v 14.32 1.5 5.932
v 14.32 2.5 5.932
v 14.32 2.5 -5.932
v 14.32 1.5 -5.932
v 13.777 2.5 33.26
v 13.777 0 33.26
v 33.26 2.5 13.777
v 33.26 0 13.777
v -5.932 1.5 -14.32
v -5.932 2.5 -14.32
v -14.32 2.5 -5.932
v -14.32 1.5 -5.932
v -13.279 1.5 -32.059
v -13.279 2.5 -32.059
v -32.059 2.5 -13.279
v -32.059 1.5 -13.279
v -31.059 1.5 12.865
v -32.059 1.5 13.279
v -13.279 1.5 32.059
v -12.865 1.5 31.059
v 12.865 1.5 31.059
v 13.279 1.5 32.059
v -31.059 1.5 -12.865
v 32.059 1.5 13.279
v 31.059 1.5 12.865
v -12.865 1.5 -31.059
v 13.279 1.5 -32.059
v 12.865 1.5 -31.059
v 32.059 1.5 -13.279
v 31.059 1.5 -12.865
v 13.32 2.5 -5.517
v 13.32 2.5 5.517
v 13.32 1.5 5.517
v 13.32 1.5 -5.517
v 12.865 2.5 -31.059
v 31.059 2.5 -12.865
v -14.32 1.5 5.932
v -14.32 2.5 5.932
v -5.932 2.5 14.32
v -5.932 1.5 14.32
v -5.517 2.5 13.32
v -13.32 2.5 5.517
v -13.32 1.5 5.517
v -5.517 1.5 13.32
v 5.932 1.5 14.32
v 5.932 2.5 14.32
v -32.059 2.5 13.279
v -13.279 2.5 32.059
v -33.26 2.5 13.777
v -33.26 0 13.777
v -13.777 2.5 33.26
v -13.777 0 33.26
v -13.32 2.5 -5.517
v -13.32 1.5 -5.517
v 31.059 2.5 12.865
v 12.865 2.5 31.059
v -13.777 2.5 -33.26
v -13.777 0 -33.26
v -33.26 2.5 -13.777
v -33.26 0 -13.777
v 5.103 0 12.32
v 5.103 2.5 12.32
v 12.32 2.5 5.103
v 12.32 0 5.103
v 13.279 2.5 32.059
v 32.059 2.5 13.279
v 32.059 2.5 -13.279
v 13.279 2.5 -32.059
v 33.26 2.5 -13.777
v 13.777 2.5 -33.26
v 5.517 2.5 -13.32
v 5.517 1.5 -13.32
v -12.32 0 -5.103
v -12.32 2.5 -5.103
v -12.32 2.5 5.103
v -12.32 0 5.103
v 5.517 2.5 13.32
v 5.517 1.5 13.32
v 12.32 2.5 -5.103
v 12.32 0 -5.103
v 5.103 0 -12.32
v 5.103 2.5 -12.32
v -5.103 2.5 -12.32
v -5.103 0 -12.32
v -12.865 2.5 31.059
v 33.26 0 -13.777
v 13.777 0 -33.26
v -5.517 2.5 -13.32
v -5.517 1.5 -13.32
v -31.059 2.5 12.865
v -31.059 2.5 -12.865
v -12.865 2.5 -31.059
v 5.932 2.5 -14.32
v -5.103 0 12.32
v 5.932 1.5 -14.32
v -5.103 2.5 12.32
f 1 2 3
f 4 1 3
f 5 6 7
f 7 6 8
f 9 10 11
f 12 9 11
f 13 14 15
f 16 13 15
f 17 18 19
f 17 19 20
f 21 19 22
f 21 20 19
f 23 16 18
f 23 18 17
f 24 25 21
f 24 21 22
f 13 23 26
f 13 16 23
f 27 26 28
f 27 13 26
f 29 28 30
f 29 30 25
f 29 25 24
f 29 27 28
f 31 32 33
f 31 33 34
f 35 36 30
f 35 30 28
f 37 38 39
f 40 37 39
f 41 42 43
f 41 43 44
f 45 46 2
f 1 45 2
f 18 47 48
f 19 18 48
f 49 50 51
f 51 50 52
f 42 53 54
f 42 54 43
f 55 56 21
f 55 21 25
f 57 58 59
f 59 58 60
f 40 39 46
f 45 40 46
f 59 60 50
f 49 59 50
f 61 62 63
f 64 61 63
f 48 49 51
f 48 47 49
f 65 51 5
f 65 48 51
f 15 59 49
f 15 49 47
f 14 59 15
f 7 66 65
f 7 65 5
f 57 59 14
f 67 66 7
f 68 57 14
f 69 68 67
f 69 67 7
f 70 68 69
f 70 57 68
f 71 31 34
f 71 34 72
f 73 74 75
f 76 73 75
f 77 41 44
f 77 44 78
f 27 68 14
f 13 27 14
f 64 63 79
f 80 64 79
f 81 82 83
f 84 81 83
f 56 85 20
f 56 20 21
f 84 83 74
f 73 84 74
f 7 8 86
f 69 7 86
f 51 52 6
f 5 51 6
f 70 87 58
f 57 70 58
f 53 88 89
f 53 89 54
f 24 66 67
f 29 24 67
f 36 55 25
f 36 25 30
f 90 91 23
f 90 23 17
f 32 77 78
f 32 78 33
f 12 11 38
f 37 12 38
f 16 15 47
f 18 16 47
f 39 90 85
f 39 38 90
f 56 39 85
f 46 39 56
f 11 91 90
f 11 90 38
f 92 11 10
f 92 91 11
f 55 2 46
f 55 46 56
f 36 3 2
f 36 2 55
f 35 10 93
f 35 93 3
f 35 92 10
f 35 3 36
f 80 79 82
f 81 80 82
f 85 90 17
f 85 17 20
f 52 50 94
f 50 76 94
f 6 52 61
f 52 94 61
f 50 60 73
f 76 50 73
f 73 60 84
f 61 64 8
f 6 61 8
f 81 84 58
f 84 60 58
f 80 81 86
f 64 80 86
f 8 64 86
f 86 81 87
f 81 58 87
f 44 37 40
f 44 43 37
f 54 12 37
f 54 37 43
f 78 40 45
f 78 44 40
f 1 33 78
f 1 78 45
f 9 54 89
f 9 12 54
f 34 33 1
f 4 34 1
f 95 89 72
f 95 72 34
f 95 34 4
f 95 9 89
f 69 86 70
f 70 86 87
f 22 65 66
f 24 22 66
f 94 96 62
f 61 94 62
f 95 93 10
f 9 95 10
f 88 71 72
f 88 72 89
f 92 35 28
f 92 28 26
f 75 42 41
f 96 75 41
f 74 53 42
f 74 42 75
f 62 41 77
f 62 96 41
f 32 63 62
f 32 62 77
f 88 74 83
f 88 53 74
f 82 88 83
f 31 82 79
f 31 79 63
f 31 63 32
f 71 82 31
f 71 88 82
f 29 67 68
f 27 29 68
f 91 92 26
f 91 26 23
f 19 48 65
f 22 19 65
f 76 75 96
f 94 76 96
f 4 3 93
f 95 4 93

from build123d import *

# Parameters (mm, degrees)
EXTRUDE_1_DEPTH     = 2.5
CUT_EXTRUDE_1_DEPTH = 1
CUT_EXTRUDE_2_DEPTH = 3.8
CUT_EXTRUDE_3_DEPTH = 1


with BuildPart() as part:
    # 스케치1 → 보스-돌출1 (new body)
    with BuildSketch(Plane(origin=(0, 0, 0), x_dir=(1, 0, 0), z_dir=(0, 1, 0))):
        Polygon((-13.776603565, -33.25966317), (13.776603565, -33.25966317), (33.25966317, -13.776603565), (33.25966317, 13.776603565), (13.776603565, 33.25966317), (-13.776603565, 33.25966317), (-33.25966317, 13.776603565), (-33.25966317, -13.776603565), align=None)
    extrude(amount=EXTRUDE_1_DEPTH)

    # 스케치2 → 컷-돌출1 (cut)
    with BuildSketch(Plane(origin=(0, 2.5, 0), x_dir=(1, 0, 0), z_dir=(0, 1, 0))):
        Polygon((13.279115103, -32.058619778), (32.058619778, -13.279115103), (32.058619778, 13.279115103), (13.279115103, 32.058619778), (-13.279115103, 32.058619778), (-32.058619778, 13.279115103), (-32.058619778, -13.279115103), (-13.279115103, -32.058619778), align=None)
        Polygon((12.864901541, -31.058619778), (31.058619778, -12.864901541), (31.058619778, 12.864901541), (12.864901541, 31.058619778), (-12.864901541, 31.058619778), (-31.058619778, 12.864901541), (-31.058619778, -12.864901541), (-12.864901541, -31.058619778), align=None, mode=Mode.SUBTRACT)
    extrude(amount=-CUT_EXTRUDE_1_DEPTH, mode=Mode.SUBTRACT)

    # 스케치4 → 컷-돌출2 (cut)
    with BuildSketch(Plane(origin=(0, 2.5, 0), x_dir=(1, 0, 0), z_dir=(0, 1, 0))):
        Polygon((-5.103166077, -12.320132754), (5.103166077, -12.320132754), (12.320132754, -5.103166077), (12.320132754, 5.103166077), (5.103166077, 12.320132754), (-5.103166077, 12.320132754), (-12.320132754, 5.103166077), (-12.320132754, -5.103166077), align=None)
    extrude(amount=-CUT_EXTRUDE_2_DEPTH, mode=Mode.SUBTRACT)

    # 스케치4<3> → 컷-돌출3 (cut)
    with BuildSketch(Plane(origin=(0, 2.5, 0), x_dir=(1, 0, 0), z_dir=(0, 1, 0))):
        Polygon((-5.931593202, -14.320132754), (5.931593202, -14.320132754), (14.320132754, -5.931593202), (14.320132754, 5.931593202), (5.931593202, 14.320132754), (-5.931593202, 14.320132754), (-14.320132754, 5.931593202), (-14.320132754, -5.931593202), align=None)
        Polygon((13.320132754, -5.517379639), (5.517379639, -13.320132754), (-5.517379639, -13.320132754), (-13.320132754, -5.517379639), (-13.320132754, 5.517379639), (-5.517379639, 13.320132754), (5.517379639, 13.320132754), (13.320132754, 5.517379639), align=None, mode=Mode.SUBTRACT)
    extrude(amount=-CUT_EXTRUDE_3_DEPTH, mode=Mode.SUBTRACT)


solid = part.part
